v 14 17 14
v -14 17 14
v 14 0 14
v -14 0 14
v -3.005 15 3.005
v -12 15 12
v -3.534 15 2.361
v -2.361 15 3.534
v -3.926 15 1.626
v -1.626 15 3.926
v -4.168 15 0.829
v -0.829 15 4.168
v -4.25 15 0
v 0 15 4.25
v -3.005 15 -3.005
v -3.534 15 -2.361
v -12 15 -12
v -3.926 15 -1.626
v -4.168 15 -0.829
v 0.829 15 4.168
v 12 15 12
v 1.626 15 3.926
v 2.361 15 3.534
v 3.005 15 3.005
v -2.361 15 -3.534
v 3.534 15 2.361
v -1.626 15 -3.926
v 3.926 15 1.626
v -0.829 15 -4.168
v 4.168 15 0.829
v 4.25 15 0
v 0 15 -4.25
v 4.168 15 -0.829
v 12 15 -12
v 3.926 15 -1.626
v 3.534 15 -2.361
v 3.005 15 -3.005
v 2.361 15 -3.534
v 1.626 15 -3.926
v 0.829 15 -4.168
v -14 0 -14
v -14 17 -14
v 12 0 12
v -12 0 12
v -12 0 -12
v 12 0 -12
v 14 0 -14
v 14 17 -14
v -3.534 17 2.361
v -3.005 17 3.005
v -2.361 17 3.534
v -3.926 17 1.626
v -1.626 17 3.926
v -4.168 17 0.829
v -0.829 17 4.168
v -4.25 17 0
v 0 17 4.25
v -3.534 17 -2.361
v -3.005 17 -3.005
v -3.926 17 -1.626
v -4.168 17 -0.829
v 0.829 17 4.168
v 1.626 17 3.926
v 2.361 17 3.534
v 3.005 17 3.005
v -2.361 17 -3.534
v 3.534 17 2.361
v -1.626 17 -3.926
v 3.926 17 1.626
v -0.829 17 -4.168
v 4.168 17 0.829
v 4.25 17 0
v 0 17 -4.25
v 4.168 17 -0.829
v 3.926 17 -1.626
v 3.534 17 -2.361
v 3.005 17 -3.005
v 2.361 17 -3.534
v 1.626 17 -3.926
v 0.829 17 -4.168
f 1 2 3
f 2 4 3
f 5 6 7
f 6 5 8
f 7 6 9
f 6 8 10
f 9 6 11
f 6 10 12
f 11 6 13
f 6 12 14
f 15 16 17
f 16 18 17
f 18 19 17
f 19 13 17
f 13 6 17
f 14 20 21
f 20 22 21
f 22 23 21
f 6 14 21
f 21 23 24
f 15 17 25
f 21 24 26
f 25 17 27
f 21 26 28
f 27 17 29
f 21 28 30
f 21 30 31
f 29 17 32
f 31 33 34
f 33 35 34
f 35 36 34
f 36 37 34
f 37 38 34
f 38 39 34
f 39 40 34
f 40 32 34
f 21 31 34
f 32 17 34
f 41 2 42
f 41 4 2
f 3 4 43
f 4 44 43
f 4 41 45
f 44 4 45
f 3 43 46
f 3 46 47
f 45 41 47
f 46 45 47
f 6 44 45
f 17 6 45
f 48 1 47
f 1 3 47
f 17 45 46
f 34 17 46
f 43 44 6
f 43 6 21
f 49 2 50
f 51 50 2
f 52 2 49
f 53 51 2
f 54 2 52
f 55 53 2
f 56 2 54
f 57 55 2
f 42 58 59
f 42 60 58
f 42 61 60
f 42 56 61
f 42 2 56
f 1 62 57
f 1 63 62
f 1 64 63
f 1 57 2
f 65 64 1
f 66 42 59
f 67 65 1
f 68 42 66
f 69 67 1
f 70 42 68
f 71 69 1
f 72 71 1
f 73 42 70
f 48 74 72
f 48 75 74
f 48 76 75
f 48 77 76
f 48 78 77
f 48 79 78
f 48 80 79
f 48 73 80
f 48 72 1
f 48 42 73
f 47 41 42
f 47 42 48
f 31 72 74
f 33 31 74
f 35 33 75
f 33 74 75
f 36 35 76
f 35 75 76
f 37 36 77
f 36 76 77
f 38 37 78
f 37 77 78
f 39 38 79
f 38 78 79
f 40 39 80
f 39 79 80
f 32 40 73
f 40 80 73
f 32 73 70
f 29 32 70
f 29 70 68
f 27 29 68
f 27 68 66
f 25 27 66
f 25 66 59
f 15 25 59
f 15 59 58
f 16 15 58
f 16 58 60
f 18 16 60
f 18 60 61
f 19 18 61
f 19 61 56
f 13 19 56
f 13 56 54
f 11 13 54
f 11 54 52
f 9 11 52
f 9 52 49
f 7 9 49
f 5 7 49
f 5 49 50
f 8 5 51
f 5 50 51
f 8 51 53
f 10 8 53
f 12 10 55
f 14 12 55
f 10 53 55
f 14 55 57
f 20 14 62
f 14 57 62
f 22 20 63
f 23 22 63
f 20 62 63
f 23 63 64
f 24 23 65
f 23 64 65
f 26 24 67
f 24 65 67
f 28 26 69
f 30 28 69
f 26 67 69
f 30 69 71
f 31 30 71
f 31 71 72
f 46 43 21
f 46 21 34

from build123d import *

# Parameters (mm, degrees)
SKETCH1_W           = 28
SKETCH1_H           = 28
SKETCH1_W_2         = 24
SKETCH1_H_2         = 24
BOSS_EXTRUDE1_DEPTH = 15
SKETCH2_W           = 28
SKETCH2_H           = 28
BOSS_EXTRUDE2_DEPTH = 2
CUT_EXTRUDE1_REACH  = 19
SKETCH3_R           = 4.25


with BuildPart() as part:
    # Sketch1 → Boss-Extrude1 (new body)
    with BuildSketch(Plane(origin=(0, 0, 0), x_dir=(1, 0, 0), z_dir=(0, 1, 0))):
        Rectangle(SKETCH1_W, SKETCH1_H)
        Rectangle(SKETCH1_W_2, SKETCH1_H_2, mode=Mode.SUBTRACT)
    extrude(amount=BOSS_EXTRUDE1_DEPTH)

    # Sketch2 → Boss-Extrude2 (add)
    with BuildSketch(Plane(origin=(0, 15, 0), x_dir=(1, 0, 0), z_dir=(0, 1, 0))):
        Rectangle(SKETCH2_W, SKETCH2_H)
    extrude(amount=BOSS_EXTRUDE2_DEPTH)

    # Sketch3 → Cut-Extrude1 (cut, up to next)
    with BuildSketch(Plane(origin=(0, 17, 0), x_dir=(1, 0, 0), z_dir=(0, 1, 0)), mode=Mode.PRIVATE) as cut_extrude1_sk1:
        Circle(SKETCH3_R)
    cut_extrude1_tool1 = extrude(cut_extrude1_sk1.sketch, amount=-CUT_EXTRUDE1_REACH, mode=Mode.PRIVATE) & part.part
    add(cut_extrude1_tool1.solids().sort_by_distance((0, 17, 0))[0], mode=Mode.SUBTRACT)


solid = part.part
